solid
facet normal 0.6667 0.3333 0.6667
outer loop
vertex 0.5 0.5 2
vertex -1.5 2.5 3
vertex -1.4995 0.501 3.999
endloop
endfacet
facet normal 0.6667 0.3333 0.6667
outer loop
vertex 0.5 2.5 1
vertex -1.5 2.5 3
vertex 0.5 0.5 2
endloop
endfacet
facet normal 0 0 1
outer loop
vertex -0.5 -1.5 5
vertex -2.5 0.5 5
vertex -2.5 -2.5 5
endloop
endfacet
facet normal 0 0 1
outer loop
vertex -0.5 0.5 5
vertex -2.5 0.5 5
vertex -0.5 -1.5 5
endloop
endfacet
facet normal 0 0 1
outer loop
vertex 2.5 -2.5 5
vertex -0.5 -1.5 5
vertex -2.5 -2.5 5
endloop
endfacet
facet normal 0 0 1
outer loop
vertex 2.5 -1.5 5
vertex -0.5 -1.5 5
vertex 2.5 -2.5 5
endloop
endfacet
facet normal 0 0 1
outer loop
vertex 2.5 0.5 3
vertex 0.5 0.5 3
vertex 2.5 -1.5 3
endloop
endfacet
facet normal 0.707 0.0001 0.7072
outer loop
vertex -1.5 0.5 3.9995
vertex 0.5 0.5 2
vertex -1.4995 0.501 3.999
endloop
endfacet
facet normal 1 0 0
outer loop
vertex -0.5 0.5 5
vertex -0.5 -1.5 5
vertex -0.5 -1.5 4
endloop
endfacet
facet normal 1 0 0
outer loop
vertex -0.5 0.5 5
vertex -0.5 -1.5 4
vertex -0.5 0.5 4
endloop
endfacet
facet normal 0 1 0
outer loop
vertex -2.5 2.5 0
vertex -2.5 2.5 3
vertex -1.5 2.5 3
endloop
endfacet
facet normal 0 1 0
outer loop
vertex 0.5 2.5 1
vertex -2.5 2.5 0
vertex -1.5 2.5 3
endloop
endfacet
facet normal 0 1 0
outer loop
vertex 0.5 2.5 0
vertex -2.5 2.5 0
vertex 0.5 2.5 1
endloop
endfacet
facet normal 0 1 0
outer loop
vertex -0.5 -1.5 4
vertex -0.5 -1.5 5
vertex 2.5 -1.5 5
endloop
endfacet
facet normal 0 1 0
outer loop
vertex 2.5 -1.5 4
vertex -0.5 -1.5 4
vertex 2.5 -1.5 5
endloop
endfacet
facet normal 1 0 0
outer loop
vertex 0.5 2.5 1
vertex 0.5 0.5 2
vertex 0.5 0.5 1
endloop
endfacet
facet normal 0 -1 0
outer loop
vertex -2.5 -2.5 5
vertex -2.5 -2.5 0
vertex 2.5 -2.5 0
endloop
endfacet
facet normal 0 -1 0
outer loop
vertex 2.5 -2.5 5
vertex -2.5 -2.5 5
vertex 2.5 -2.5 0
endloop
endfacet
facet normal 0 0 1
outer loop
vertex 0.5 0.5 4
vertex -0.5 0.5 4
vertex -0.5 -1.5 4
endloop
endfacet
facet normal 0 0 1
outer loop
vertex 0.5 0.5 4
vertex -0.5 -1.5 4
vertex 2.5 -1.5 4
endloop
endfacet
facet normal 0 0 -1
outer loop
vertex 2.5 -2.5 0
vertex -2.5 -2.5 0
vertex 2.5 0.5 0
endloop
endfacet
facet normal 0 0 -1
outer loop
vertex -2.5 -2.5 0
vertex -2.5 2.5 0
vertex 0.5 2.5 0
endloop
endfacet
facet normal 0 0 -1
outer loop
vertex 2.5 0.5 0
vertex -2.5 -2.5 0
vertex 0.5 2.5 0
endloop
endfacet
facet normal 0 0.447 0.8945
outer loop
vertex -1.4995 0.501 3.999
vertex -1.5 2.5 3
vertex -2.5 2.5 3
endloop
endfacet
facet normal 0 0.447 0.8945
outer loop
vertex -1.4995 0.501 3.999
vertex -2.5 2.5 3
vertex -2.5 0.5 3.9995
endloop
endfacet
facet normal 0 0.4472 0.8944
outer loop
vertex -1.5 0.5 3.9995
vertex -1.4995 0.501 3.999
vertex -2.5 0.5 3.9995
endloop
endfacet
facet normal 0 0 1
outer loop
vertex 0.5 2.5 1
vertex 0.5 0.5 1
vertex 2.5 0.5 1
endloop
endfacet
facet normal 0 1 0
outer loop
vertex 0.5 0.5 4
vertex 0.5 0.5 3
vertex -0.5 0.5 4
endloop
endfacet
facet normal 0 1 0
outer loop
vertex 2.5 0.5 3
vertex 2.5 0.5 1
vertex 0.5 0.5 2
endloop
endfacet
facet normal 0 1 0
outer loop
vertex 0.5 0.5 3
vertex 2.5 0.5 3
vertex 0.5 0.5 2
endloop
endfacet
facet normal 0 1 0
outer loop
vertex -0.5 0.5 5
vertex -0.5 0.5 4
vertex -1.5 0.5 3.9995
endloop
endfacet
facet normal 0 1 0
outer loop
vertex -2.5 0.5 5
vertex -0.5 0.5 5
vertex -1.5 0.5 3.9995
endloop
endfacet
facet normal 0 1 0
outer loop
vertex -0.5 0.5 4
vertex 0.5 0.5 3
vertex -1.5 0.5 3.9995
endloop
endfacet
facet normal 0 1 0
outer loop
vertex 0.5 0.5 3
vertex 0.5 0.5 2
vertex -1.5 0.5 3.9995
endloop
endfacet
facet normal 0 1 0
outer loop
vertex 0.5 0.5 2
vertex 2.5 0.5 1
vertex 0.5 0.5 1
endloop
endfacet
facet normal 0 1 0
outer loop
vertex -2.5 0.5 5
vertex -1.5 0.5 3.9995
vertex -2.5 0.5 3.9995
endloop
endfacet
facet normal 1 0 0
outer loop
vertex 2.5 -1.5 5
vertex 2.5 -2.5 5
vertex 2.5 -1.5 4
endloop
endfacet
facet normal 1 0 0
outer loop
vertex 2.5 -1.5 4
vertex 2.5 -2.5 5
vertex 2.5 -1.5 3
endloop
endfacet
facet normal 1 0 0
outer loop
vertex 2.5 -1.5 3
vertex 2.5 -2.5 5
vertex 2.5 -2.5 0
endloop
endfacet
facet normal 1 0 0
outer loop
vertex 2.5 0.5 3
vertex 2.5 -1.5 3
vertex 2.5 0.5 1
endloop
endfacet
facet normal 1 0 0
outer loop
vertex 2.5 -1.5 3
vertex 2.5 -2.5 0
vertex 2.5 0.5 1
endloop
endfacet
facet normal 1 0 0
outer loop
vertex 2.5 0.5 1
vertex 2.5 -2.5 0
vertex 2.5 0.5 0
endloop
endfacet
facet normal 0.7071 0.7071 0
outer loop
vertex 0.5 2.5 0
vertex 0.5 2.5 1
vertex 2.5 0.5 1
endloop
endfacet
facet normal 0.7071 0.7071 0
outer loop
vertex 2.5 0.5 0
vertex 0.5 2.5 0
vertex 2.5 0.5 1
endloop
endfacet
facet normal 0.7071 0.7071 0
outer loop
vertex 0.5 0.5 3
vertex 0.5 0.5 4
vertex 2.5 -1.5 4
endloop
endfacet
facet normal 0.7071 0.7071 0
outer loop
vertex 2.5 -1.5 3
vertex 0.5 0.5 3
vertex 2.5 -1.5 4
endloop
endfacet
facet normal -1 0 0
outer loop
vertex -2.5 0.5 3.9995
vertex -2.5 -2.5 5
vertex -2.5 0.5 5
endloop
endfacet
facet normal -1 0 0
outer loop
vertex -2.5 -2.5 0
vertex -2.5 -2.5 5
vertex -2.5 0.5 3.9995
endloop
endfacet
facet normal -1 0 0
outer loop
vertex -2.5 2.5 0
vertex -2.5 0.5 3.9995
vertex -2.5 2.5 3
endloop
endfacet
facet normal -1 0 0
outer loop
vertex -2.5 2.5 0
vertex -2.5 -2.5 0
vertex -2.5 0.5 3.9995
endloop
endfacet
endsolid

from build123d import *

# Parameters (mm, degrees)
SKETCH1_W           = 5
SKETCH1_H           = 5
BOSS_EXTRUDE1_DEPTH = 5
CUT_EXTRUDE2_DEPTH  = 2
CUT_EXTRUDE3_DEPTH  = 2
CUT_EXTRUDE4_DEPTH  = 2
SKETCH6_W           = 3
SKETCH6_H           = 2
CUT_EXTRUDE5_DEPTH  = 1
CUT_EXTRUDE6_DEPTH  = 1
CUT_EXTRUDE7_DEPTH  = 1
CUT_EXTRUDE8_DEPTH  = 3


with BuildPart() as part:
    # Sketch1 → Boss-Extrude1 (new body)
    with BuildSketch(Plane.XY):
        Rectangle(SKETCH1_W, SKETCH1_H)
    extrude(amount=BOSS_EXTRUDE1_DEPTH)

    # Sketch3 → Cut-Extrude2 (cut)
    with BuildSketch(Plane(origin=(0, 2.5, 0), x_dir=(1, 0, 0), z_dir=(0, 1, 0))):
        Polygon((-2.5, -5), (-2.5, -3.999504656), (-0.5, -3.999504656), (-0.5, -3), (0.5, -3), (0.5, -1), (2.5, -1), (2.5, -5), align=None)
    extrude(amount=-CUT_EXTRUDE2_DEPTH, mode=Mode.SUBTRACT)

    # Sketch4 → Cut-Extrude3 (cut)
    with BuildSketch(Plane(origin=(-0.5, 0, 0), x_dir=(0, 0, -1), z_dir=(1, 0, 0))):
        Polygon((-3, 2.5), (-3.999504656, 0.5), (-3.999504656, 2.5), align=None)
    extrude(amount=-CUT_EXTRUDE3_DEPTH, mode=Mode.SUBTRACT)

    # Sketch5 → Cut-Extrude4 (cut)
    with BuildSketch(Plane.XY.offset(1)):
        Polygon((0.5, 2.5), (2.5, 0.5), (2.5, 2.5), align=None)
    extrude(amount=-CUT_EXTRUDE4_DEPTH, mode=Mode.SUBTRACT)

    # Sketch6 → Cut-Extrude5 (cut)
    with BuildSketch(Plane.XY.offset(5)):
        with Locations((1, -0.5)):
            Rectangle(SKETCH6_W, SKETCH6_H)
    extrude(amount=-CUT_EXTRUDE5_DEPTH, mode=Mode.SUBTRACT)

    # Sketch7 → Cut-Extrude6 (cut)
    with BuildSketch(Plane.XY.offset(4)):
        Polygon((2.5, 0.5), (0.5, 0.5), (2.5, -1.5), align=None)
    extrude(amount=-CUT_EXTRUDE6_DEPTH, mode=Mode.SUBTRACT)

    # Sketch11 → Cut-Extrude7 (cut)
    with BuildSketch(Plane(origin=(1.222222222, 0.611111111, 1.222222222), x_dir=(0.745355992, -0.298142397, -0.596284794), z_dir=(0.666666667, 0.333333333, 0.666666667))):
        Polygon((-0.96896279, 1.788854382), (-3.652244363, 0.894427191), (-3.652244363, -1.341419262), (-0.96896279, -0.447213595), align=None)
    extrude(amount=CUT_EXTRUDE7_DEPTH, mode=Mode.SUBTRACT)

    # Sketch12 → Cut-Extrude8 (cut, through all)
    with BuildSketch(Plane(origin=(0, 0.5, 0), x_dir=(1, 0, 0), z_dir=(0, 1, 0))):
        Polygon((0.5, -2), (-1.5, -3.999504656), (0.5, -4), align=None)
    extrude(amount=CUT_EXTRUDE8_DEPTH, mode=Mode.SUBTRACT)


solid = part.part
